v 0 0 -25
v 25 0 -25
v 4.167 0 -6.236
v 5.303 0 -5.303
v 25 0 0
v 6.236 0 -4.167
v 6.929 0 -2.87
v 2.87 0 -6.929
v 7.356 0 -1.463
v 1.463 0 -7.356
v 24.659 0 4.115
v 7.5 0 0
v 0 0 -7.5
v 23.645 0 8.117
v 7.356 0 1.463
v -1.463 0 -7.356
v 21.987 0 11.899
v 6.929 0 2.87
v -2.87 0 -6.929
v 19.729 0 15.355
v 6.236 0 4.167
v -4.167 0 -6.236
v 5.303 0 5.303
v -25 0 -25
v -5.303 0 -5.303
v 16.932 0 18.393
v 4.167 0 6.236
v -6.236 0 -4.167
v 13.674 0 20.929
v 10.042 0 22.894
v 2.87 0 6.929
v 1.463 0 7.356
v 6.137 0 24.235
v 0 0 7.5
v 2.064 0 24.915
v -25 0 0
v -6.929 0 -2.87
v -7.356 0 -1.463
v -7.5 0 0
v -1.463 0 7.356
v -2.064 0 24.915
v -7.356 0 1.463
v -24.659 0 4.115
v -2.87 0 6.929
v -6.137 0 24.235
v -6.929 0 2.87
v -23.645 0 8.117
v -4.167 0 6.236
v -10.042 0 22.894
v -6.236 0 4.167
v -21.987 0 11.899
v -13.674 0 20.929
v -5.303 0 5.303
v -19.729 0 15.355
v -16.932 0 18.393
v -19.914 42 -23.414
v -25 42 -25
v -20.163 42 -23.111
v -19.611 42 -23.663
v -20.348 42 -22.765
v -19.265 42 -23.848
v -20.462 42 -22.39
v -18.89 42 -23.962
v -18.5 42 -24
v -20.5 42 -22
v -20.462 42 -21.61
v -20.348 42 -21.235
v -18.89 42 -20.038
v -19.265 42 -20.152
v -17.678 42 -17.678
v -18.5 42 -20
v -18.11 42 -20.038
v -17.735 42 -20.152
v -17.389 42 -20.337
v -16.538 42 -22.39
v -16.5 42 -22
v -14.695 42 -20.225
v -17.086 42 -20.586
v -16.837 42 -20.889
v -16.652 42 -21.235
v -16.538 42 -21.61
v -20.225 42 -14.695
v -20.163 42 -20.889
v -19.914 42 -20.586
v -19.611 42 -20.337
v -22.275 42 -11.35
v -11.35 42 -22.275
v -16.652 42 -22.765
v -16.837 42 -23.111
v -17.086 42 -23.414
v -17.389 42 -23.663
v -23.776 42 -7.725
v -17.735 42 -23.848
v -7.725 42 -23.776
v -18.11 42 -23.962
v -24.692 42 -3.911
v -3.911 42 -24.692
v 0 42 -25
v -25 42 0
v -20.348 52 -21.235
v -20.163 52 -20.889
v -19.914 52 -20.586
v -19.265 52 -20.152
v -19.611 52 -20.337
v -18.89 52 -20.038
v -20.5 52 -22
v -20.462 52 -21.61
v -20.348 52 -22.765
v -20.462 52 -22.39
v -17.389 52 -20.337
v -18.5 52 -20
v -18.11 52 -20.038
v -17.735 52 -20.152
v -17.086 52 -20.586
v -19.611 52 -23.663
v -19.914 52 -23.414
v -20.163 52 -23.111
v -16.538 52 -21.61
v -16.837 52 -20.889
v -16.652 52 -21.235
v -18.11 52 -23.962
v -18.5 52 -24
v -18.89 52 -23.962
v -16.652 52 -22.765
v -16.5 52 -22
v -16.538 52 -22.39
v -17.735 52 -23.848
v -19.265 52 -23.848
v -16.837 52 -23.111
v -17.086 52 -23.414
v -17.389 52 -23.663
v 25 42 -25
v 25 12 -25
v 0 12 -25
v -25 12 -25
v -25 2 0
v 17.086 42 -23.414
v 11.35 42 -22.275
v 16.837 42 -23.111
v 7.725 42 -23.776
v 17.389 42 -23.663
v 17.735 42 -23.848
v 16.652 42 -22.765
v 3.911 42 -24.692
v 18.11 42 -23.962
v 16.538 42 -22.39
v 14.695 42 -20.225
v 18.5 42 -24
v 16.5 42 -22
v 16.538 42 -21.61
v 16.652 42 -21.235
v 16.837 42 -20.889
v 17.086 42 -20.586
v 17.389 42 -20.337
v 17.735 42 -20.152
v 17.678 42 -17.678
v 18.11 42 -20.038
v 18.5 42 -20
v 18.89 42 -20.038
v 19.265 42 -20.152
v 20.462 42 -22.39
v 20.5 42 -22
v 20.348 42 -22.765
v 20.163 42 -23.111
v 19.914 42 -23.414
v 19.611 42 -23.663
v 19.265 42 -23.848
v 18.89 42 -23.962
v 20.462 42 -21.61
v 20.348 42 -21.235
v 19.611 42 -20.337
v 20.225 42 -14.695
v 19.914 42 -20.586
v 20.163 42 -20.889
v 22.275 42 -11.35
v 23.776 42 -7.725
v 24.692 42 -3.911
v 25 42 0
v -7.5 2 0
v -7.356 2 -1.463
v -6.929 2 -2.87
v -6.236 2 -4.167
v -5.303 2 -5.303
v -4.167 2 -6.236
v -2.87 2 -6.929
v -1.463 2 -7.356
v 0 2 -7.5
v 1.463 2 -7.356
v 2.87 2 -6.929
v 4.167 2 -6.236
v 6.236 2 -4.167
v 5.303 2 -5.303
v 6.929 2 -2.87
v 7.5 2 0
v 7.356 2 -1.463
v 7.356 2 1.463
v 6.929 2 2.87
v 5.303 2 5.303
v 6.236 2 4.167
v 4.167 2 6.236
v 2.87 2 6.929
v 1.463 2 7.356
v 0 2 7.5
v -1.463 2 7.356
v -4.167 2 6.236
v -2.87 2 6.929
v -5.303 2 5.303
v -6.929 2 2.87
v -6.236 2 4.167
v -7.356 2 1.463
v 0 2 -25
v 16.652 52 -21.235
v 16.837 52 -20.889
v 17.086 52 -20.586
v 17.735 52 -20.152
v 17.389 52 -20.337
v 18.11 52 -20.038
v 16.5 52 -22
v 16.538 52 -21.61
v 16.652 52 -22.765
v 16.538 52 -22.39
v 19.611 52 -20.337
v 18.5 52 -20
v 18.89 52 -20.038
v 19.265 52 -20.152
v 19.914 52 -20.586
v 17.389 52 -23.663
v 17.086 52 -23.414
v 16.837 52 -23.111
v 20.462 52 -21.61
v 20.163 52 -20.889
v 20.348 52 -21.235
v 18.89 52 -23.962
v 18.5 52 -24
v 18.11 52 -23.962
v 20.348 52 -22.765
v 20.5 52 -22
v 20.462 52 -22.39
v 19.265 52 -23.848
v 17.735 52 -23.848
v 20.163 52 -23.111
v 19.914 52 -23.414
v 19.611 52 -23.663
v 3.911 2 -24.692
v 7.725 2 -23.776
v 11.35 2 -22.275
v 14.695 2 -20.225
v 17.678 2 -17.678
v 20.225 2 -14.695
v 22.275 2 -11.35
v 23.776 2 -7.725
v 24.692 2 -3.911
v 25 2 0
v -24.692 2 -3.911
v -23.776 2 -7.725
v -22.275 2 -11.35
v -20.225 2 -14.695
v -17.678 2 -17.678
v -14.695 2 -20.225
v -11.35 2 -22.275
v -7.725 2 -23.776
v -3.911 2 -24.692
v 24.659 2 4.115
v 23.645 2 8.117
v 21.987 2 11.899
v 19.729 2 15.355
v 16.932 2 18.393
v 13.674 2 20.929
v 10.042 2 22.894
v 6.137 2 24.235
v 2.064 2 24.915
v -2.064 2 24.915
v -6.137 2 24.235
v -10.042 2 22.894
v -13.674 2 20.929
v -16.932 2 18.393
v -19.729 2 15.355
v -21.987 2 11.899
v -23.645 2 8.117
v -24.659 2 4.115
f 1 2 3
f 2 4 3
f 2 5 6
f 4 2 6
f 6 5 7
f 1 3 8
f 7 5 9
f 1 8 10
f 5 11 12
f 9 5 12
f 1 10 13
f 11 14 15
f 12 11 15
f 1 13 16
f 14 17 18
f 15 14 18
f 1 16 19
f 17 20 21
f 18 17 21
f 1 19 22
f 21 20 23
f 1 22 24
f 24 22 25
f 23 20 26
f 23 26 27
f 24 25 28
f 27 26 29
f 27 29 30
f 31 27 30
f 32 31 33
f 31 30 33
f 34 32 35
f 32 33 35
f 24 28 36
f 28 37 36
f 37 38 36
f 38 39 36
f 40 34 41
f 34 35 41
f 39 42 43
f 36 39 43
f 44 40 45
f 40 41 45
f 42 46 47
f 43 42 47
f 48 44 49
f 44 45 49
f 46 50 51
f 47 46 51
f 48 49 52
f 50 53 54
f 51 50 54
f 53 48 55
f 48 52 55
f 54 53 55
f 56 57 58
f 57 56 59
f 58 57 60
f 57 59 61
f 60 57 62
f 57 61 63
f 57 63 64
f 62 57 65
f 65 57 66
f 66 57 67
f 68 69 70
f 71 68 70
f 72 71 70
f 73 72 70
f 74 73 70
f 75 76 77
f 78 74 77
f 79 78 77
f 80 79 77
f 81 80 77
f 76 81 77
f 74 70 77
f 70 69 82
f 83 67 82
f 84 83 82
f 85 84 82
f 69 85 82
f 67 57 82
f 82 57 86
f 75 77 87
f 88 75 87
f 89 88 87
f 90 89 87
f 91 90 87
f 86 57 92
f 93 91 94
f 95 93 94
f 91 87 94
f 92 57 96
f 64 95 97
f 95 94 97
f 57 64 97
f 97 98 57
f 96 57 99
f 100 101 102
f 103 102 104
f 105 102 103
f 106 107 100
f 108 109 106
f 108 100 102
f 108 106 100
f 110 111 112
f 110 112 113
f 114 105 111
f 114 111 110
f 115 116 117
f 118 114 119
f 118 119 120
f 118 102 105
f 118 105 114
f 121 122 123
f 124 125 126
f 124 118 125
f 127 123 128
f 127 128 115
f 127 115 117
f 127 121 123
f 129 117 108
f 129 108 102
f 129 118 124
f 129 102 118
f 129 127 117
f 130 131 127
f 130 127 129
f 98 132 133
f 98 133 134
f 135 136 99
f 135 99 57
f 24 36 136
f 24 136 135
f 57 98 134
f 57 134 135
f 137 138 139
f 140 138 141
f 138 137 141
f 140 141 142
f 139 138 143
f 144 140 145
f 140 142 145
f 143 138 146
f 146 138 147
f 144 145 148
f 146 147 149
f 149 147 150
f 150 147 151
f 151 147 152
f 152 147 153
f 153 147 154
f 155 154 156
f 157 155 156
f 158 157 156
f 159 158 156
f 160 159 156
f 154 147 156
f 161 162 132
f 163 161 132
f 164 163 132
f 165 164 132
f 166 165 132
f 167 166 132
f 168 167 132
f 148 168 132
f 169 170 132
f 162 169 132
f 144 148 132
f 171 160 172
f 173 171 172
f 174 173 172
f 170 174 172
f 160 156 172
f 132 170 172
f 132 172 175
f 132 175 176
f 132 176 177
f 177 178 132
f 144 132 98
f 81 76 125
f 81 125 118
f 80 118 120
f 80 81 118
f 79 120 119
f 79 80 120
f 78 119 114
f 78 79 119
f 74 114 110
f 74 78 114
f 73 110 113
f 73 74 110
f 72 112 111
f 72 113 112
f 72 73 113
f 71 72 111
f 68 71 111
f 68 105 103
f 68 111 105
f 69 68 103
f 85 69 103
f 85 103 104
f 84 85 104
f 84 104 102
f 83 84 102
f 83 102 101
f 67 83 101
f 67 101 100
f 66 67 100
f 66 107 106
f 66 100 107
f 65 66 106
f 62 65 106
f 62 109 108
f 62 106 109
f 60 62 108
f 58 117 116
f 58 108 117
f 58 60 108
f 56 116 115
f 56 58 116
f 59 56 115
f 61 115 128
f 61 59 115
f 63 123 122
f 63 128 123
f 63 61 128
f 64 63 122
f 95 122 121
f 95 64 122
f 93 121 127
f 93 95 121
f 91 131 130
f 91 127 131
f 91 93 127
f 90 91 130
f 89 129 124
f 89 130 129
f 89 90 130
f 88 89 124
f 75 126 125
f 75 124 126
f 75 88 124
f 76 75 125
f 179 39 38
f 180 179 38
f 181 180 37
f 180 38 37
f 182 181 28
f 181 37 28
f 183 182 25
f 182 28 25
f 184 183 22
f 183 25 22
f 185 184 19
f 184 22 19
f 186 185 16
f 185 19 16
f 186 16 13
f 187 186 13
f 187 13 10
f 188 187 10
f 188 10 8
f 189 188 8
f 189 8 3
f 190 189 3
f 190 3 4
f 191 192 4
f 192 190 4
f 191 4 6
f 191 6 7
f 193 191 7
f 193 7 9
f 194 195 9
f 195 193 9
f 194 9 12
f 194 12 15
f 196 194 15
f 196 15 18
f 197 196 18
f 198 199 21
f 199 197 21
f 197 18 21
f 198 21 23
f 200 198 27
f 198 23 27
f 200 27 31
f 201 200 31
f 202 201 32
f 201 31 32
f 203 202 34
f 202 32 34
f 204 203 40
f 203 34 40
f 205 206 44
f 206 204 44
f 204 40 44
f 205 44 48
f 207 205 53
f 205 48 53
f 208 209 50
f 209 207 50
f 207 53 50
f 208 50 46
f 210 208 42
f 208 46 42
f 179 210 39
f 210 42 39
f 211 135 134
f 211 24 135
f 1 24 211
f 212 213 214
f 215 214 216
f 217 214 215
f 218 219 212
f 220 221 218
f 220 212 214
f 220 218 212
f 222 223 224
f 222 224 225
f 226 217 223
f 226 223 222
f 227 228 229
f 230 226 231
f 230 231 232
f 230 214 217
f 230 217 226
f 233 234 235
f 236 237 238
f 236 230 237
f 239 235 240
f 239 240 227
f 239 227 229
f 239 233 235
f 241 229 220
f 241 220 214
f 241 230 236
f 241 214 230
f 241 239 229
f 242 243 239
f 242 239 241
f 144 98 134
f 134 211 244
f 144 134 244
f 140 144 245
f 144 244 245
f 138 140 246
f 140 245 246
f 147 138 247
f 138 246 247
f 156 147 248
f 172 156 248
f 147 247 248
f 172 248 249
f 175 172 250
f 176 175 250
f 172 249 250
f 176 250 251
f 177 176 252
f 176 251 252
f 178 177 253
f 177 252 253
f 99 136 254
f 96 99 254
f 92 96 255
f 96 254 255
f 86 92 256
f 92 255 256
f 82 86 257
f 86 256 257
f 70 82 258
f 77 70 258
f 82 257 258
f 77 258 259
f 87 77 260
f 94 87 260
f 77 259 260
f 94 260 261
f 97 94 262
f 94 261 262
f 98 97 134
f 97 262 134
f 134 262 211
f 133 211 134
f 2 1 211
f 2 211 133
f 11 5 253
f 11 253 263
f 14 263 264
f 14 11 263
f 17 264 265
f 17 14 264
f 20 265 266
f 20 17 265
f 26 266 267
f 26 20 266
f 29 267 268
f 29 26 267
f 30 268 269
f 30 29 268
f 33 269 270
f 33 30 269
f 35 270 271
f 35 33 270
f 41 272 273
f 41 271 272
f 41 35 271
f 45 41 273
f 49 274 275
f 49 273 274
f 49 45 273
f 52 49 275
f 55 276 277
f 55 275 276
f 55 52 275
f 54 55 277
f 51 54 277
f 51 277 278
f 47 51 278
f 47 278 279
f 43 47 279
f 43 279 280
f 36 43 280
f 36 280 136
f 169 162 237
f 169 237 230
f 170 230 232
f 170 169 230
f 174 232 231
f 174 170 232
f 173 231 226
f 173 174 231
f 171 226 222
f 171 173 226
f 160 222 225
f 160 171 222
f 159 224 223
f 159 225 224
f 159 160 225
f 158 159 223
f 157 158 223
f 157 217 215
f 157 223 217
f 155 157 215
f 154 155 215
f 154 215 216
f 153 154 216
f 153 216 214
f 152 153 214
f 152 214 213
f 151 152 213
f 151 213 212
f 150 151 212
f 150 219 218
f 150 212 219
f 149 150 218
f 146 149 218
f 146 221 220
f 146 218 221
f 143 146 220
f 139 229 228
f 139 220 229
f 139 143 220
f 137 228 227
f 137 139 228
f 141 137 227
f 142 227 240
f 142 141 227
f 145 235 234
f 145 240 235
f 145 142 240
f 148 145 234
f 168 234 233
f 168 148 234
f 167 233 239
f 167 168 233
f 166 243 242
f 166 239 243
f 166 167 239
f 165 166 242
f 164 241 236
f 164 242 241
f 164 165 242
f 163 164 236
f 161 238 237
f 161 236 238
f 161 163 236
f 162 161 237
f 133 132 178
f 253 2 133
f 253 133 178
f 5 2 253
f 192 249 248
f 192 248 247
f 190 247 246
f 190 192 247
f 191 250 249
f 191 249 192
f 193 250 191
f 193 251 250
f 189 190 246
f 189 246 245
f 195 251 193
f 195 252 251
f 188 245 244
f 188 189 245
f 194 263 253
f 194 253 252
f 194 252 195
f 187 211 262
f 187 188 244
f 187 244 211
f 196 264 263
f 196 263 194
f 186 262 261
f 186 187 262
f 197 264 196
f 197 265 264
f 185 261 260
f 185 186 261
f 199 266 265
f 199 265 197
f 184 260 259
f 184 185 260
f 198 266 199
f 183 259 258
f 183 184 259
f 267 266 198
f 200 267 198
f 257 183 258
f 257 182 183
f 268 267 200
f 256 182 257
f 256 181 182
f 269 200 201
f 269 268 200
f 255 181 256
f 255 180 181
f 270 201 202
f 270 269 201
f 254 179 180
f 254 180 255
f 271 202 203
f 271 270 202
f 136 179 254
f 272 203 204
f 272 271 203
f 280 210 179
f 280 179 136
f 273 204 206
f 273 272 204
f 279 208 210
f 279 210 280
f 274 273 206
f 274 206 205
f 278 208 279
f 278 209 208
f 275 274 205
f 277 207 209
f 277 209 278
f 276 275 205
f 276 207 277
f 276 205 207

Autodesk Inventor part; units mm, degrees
ref_plane "YZ Plane" through (0, 0, 0) normal (1, 0, 0) x (0, 1, 0)
ref_plane "XZ Plane" through (0, 0, 0) normal (0, 1, 0) x (-1, 0, 0)
ref_plane "XY Plane" through (0, 0, 0) normal (0, 0, 1) x (1, 0, 0)
sketch "Sketch1" plane through (0, 0, 0) normal (0, 1, 0) x (-1, 0, 0)
  circle A0 centre (0, 0) radius 7.5
  circle A1 centre (0, 0) radius 25
  dimension "d0" = 15
  dimension "d1" = 50
extrude "Extrusion1" add sketch "Sketch1" along normal blind 2
sketch "Sketch2" plane through (0, 2, 0) normal (0, 1, 0) x (1, 0, 0)
  circle A0 centre (0, 0) radius 25 projected
  line L0 (25, 0) -> (-25, 0)
  line L1 (-25, 0) -> (-25, 25)
  line L2 (-25, 25) -> (25, 25)
  line L3 (25, 25) -> (25, 0)
  point P0 (0, 25)
extrude "Extrusion2" add sketch "Sketch2" along normal blind 10 and the other way blind 2 contours L1 L2 A0 | A0 L2 L3
sketch "Sketch3" plane through (0, 12, 0) normal (0, 1, 0) x (1, 0, 0)
  circle A0 centre (21.5, 18.5) radius 2
  circle A1 centre (-21.5, 18.5) radius 2
  point P0 (0, 0)
  dimension "d8" = 4
  dimension "d9" = 4
extrude "Extrusion3" add sketch "Sketch3" along normal blind 40
sketch "Sketch4" plane through (0, 0, 0) normal (0, -1, 0) x (1, 0, 0)
  line L0 (25, -25) -> (0, -25) projected
  arc A0 (25, 0) -> (-25, 0) centre (0, 0) ccw projected
  line L1 (25, -25) -> (-25, -25)
  line L2 (-25, -25) -> (-25, 0)
  line L3 (-25, 0) -> (25, 0)
  line L4 (25, 0) -> (25, -25)
  arc A1 (0, -25) -> (25, 0) centre (0, 0) ccw projected
  arc A2 (-25, 0) -> (25, 0) centre (0, 0) ccw
extrude "Extrusion4" add sketch "Sketch4" against normal blind 42 contours L0 A1 L4 | L1 L2 A2
sketch "Sketch5" plane through (21.5, 52, -18.5) normal (0, 1, 0) x (1, 0, 0)
  circle A0 centre (0, 0) radius 2 projected
  circle A1 centre (0, 0) radius 2
  circle A2 centre (-43, 0) radius 2 projected
  circle A3 centre (-43, 0) radius 2
  point P0 (-21.5, -18.5)
extrude "Extrusion5" cut sketch "Sketch5" against normal blind 10
sketch "Sketch6" plane through (0, 42, 0) normal (0, 1, 0) x (1, 0, 0)
  circle A0 centre (18.5, 22) radius 2
  circle A1 centre (-18.5, 22) radius 2
  point P0 (0, 0)
  dimension "d16" = 4
  dimension "d17" = 4
extrude "Extrusion6" add sketch "Sketch6" along normal blind 10
properties part number "trail 3.1" material "Iron, Gray"
